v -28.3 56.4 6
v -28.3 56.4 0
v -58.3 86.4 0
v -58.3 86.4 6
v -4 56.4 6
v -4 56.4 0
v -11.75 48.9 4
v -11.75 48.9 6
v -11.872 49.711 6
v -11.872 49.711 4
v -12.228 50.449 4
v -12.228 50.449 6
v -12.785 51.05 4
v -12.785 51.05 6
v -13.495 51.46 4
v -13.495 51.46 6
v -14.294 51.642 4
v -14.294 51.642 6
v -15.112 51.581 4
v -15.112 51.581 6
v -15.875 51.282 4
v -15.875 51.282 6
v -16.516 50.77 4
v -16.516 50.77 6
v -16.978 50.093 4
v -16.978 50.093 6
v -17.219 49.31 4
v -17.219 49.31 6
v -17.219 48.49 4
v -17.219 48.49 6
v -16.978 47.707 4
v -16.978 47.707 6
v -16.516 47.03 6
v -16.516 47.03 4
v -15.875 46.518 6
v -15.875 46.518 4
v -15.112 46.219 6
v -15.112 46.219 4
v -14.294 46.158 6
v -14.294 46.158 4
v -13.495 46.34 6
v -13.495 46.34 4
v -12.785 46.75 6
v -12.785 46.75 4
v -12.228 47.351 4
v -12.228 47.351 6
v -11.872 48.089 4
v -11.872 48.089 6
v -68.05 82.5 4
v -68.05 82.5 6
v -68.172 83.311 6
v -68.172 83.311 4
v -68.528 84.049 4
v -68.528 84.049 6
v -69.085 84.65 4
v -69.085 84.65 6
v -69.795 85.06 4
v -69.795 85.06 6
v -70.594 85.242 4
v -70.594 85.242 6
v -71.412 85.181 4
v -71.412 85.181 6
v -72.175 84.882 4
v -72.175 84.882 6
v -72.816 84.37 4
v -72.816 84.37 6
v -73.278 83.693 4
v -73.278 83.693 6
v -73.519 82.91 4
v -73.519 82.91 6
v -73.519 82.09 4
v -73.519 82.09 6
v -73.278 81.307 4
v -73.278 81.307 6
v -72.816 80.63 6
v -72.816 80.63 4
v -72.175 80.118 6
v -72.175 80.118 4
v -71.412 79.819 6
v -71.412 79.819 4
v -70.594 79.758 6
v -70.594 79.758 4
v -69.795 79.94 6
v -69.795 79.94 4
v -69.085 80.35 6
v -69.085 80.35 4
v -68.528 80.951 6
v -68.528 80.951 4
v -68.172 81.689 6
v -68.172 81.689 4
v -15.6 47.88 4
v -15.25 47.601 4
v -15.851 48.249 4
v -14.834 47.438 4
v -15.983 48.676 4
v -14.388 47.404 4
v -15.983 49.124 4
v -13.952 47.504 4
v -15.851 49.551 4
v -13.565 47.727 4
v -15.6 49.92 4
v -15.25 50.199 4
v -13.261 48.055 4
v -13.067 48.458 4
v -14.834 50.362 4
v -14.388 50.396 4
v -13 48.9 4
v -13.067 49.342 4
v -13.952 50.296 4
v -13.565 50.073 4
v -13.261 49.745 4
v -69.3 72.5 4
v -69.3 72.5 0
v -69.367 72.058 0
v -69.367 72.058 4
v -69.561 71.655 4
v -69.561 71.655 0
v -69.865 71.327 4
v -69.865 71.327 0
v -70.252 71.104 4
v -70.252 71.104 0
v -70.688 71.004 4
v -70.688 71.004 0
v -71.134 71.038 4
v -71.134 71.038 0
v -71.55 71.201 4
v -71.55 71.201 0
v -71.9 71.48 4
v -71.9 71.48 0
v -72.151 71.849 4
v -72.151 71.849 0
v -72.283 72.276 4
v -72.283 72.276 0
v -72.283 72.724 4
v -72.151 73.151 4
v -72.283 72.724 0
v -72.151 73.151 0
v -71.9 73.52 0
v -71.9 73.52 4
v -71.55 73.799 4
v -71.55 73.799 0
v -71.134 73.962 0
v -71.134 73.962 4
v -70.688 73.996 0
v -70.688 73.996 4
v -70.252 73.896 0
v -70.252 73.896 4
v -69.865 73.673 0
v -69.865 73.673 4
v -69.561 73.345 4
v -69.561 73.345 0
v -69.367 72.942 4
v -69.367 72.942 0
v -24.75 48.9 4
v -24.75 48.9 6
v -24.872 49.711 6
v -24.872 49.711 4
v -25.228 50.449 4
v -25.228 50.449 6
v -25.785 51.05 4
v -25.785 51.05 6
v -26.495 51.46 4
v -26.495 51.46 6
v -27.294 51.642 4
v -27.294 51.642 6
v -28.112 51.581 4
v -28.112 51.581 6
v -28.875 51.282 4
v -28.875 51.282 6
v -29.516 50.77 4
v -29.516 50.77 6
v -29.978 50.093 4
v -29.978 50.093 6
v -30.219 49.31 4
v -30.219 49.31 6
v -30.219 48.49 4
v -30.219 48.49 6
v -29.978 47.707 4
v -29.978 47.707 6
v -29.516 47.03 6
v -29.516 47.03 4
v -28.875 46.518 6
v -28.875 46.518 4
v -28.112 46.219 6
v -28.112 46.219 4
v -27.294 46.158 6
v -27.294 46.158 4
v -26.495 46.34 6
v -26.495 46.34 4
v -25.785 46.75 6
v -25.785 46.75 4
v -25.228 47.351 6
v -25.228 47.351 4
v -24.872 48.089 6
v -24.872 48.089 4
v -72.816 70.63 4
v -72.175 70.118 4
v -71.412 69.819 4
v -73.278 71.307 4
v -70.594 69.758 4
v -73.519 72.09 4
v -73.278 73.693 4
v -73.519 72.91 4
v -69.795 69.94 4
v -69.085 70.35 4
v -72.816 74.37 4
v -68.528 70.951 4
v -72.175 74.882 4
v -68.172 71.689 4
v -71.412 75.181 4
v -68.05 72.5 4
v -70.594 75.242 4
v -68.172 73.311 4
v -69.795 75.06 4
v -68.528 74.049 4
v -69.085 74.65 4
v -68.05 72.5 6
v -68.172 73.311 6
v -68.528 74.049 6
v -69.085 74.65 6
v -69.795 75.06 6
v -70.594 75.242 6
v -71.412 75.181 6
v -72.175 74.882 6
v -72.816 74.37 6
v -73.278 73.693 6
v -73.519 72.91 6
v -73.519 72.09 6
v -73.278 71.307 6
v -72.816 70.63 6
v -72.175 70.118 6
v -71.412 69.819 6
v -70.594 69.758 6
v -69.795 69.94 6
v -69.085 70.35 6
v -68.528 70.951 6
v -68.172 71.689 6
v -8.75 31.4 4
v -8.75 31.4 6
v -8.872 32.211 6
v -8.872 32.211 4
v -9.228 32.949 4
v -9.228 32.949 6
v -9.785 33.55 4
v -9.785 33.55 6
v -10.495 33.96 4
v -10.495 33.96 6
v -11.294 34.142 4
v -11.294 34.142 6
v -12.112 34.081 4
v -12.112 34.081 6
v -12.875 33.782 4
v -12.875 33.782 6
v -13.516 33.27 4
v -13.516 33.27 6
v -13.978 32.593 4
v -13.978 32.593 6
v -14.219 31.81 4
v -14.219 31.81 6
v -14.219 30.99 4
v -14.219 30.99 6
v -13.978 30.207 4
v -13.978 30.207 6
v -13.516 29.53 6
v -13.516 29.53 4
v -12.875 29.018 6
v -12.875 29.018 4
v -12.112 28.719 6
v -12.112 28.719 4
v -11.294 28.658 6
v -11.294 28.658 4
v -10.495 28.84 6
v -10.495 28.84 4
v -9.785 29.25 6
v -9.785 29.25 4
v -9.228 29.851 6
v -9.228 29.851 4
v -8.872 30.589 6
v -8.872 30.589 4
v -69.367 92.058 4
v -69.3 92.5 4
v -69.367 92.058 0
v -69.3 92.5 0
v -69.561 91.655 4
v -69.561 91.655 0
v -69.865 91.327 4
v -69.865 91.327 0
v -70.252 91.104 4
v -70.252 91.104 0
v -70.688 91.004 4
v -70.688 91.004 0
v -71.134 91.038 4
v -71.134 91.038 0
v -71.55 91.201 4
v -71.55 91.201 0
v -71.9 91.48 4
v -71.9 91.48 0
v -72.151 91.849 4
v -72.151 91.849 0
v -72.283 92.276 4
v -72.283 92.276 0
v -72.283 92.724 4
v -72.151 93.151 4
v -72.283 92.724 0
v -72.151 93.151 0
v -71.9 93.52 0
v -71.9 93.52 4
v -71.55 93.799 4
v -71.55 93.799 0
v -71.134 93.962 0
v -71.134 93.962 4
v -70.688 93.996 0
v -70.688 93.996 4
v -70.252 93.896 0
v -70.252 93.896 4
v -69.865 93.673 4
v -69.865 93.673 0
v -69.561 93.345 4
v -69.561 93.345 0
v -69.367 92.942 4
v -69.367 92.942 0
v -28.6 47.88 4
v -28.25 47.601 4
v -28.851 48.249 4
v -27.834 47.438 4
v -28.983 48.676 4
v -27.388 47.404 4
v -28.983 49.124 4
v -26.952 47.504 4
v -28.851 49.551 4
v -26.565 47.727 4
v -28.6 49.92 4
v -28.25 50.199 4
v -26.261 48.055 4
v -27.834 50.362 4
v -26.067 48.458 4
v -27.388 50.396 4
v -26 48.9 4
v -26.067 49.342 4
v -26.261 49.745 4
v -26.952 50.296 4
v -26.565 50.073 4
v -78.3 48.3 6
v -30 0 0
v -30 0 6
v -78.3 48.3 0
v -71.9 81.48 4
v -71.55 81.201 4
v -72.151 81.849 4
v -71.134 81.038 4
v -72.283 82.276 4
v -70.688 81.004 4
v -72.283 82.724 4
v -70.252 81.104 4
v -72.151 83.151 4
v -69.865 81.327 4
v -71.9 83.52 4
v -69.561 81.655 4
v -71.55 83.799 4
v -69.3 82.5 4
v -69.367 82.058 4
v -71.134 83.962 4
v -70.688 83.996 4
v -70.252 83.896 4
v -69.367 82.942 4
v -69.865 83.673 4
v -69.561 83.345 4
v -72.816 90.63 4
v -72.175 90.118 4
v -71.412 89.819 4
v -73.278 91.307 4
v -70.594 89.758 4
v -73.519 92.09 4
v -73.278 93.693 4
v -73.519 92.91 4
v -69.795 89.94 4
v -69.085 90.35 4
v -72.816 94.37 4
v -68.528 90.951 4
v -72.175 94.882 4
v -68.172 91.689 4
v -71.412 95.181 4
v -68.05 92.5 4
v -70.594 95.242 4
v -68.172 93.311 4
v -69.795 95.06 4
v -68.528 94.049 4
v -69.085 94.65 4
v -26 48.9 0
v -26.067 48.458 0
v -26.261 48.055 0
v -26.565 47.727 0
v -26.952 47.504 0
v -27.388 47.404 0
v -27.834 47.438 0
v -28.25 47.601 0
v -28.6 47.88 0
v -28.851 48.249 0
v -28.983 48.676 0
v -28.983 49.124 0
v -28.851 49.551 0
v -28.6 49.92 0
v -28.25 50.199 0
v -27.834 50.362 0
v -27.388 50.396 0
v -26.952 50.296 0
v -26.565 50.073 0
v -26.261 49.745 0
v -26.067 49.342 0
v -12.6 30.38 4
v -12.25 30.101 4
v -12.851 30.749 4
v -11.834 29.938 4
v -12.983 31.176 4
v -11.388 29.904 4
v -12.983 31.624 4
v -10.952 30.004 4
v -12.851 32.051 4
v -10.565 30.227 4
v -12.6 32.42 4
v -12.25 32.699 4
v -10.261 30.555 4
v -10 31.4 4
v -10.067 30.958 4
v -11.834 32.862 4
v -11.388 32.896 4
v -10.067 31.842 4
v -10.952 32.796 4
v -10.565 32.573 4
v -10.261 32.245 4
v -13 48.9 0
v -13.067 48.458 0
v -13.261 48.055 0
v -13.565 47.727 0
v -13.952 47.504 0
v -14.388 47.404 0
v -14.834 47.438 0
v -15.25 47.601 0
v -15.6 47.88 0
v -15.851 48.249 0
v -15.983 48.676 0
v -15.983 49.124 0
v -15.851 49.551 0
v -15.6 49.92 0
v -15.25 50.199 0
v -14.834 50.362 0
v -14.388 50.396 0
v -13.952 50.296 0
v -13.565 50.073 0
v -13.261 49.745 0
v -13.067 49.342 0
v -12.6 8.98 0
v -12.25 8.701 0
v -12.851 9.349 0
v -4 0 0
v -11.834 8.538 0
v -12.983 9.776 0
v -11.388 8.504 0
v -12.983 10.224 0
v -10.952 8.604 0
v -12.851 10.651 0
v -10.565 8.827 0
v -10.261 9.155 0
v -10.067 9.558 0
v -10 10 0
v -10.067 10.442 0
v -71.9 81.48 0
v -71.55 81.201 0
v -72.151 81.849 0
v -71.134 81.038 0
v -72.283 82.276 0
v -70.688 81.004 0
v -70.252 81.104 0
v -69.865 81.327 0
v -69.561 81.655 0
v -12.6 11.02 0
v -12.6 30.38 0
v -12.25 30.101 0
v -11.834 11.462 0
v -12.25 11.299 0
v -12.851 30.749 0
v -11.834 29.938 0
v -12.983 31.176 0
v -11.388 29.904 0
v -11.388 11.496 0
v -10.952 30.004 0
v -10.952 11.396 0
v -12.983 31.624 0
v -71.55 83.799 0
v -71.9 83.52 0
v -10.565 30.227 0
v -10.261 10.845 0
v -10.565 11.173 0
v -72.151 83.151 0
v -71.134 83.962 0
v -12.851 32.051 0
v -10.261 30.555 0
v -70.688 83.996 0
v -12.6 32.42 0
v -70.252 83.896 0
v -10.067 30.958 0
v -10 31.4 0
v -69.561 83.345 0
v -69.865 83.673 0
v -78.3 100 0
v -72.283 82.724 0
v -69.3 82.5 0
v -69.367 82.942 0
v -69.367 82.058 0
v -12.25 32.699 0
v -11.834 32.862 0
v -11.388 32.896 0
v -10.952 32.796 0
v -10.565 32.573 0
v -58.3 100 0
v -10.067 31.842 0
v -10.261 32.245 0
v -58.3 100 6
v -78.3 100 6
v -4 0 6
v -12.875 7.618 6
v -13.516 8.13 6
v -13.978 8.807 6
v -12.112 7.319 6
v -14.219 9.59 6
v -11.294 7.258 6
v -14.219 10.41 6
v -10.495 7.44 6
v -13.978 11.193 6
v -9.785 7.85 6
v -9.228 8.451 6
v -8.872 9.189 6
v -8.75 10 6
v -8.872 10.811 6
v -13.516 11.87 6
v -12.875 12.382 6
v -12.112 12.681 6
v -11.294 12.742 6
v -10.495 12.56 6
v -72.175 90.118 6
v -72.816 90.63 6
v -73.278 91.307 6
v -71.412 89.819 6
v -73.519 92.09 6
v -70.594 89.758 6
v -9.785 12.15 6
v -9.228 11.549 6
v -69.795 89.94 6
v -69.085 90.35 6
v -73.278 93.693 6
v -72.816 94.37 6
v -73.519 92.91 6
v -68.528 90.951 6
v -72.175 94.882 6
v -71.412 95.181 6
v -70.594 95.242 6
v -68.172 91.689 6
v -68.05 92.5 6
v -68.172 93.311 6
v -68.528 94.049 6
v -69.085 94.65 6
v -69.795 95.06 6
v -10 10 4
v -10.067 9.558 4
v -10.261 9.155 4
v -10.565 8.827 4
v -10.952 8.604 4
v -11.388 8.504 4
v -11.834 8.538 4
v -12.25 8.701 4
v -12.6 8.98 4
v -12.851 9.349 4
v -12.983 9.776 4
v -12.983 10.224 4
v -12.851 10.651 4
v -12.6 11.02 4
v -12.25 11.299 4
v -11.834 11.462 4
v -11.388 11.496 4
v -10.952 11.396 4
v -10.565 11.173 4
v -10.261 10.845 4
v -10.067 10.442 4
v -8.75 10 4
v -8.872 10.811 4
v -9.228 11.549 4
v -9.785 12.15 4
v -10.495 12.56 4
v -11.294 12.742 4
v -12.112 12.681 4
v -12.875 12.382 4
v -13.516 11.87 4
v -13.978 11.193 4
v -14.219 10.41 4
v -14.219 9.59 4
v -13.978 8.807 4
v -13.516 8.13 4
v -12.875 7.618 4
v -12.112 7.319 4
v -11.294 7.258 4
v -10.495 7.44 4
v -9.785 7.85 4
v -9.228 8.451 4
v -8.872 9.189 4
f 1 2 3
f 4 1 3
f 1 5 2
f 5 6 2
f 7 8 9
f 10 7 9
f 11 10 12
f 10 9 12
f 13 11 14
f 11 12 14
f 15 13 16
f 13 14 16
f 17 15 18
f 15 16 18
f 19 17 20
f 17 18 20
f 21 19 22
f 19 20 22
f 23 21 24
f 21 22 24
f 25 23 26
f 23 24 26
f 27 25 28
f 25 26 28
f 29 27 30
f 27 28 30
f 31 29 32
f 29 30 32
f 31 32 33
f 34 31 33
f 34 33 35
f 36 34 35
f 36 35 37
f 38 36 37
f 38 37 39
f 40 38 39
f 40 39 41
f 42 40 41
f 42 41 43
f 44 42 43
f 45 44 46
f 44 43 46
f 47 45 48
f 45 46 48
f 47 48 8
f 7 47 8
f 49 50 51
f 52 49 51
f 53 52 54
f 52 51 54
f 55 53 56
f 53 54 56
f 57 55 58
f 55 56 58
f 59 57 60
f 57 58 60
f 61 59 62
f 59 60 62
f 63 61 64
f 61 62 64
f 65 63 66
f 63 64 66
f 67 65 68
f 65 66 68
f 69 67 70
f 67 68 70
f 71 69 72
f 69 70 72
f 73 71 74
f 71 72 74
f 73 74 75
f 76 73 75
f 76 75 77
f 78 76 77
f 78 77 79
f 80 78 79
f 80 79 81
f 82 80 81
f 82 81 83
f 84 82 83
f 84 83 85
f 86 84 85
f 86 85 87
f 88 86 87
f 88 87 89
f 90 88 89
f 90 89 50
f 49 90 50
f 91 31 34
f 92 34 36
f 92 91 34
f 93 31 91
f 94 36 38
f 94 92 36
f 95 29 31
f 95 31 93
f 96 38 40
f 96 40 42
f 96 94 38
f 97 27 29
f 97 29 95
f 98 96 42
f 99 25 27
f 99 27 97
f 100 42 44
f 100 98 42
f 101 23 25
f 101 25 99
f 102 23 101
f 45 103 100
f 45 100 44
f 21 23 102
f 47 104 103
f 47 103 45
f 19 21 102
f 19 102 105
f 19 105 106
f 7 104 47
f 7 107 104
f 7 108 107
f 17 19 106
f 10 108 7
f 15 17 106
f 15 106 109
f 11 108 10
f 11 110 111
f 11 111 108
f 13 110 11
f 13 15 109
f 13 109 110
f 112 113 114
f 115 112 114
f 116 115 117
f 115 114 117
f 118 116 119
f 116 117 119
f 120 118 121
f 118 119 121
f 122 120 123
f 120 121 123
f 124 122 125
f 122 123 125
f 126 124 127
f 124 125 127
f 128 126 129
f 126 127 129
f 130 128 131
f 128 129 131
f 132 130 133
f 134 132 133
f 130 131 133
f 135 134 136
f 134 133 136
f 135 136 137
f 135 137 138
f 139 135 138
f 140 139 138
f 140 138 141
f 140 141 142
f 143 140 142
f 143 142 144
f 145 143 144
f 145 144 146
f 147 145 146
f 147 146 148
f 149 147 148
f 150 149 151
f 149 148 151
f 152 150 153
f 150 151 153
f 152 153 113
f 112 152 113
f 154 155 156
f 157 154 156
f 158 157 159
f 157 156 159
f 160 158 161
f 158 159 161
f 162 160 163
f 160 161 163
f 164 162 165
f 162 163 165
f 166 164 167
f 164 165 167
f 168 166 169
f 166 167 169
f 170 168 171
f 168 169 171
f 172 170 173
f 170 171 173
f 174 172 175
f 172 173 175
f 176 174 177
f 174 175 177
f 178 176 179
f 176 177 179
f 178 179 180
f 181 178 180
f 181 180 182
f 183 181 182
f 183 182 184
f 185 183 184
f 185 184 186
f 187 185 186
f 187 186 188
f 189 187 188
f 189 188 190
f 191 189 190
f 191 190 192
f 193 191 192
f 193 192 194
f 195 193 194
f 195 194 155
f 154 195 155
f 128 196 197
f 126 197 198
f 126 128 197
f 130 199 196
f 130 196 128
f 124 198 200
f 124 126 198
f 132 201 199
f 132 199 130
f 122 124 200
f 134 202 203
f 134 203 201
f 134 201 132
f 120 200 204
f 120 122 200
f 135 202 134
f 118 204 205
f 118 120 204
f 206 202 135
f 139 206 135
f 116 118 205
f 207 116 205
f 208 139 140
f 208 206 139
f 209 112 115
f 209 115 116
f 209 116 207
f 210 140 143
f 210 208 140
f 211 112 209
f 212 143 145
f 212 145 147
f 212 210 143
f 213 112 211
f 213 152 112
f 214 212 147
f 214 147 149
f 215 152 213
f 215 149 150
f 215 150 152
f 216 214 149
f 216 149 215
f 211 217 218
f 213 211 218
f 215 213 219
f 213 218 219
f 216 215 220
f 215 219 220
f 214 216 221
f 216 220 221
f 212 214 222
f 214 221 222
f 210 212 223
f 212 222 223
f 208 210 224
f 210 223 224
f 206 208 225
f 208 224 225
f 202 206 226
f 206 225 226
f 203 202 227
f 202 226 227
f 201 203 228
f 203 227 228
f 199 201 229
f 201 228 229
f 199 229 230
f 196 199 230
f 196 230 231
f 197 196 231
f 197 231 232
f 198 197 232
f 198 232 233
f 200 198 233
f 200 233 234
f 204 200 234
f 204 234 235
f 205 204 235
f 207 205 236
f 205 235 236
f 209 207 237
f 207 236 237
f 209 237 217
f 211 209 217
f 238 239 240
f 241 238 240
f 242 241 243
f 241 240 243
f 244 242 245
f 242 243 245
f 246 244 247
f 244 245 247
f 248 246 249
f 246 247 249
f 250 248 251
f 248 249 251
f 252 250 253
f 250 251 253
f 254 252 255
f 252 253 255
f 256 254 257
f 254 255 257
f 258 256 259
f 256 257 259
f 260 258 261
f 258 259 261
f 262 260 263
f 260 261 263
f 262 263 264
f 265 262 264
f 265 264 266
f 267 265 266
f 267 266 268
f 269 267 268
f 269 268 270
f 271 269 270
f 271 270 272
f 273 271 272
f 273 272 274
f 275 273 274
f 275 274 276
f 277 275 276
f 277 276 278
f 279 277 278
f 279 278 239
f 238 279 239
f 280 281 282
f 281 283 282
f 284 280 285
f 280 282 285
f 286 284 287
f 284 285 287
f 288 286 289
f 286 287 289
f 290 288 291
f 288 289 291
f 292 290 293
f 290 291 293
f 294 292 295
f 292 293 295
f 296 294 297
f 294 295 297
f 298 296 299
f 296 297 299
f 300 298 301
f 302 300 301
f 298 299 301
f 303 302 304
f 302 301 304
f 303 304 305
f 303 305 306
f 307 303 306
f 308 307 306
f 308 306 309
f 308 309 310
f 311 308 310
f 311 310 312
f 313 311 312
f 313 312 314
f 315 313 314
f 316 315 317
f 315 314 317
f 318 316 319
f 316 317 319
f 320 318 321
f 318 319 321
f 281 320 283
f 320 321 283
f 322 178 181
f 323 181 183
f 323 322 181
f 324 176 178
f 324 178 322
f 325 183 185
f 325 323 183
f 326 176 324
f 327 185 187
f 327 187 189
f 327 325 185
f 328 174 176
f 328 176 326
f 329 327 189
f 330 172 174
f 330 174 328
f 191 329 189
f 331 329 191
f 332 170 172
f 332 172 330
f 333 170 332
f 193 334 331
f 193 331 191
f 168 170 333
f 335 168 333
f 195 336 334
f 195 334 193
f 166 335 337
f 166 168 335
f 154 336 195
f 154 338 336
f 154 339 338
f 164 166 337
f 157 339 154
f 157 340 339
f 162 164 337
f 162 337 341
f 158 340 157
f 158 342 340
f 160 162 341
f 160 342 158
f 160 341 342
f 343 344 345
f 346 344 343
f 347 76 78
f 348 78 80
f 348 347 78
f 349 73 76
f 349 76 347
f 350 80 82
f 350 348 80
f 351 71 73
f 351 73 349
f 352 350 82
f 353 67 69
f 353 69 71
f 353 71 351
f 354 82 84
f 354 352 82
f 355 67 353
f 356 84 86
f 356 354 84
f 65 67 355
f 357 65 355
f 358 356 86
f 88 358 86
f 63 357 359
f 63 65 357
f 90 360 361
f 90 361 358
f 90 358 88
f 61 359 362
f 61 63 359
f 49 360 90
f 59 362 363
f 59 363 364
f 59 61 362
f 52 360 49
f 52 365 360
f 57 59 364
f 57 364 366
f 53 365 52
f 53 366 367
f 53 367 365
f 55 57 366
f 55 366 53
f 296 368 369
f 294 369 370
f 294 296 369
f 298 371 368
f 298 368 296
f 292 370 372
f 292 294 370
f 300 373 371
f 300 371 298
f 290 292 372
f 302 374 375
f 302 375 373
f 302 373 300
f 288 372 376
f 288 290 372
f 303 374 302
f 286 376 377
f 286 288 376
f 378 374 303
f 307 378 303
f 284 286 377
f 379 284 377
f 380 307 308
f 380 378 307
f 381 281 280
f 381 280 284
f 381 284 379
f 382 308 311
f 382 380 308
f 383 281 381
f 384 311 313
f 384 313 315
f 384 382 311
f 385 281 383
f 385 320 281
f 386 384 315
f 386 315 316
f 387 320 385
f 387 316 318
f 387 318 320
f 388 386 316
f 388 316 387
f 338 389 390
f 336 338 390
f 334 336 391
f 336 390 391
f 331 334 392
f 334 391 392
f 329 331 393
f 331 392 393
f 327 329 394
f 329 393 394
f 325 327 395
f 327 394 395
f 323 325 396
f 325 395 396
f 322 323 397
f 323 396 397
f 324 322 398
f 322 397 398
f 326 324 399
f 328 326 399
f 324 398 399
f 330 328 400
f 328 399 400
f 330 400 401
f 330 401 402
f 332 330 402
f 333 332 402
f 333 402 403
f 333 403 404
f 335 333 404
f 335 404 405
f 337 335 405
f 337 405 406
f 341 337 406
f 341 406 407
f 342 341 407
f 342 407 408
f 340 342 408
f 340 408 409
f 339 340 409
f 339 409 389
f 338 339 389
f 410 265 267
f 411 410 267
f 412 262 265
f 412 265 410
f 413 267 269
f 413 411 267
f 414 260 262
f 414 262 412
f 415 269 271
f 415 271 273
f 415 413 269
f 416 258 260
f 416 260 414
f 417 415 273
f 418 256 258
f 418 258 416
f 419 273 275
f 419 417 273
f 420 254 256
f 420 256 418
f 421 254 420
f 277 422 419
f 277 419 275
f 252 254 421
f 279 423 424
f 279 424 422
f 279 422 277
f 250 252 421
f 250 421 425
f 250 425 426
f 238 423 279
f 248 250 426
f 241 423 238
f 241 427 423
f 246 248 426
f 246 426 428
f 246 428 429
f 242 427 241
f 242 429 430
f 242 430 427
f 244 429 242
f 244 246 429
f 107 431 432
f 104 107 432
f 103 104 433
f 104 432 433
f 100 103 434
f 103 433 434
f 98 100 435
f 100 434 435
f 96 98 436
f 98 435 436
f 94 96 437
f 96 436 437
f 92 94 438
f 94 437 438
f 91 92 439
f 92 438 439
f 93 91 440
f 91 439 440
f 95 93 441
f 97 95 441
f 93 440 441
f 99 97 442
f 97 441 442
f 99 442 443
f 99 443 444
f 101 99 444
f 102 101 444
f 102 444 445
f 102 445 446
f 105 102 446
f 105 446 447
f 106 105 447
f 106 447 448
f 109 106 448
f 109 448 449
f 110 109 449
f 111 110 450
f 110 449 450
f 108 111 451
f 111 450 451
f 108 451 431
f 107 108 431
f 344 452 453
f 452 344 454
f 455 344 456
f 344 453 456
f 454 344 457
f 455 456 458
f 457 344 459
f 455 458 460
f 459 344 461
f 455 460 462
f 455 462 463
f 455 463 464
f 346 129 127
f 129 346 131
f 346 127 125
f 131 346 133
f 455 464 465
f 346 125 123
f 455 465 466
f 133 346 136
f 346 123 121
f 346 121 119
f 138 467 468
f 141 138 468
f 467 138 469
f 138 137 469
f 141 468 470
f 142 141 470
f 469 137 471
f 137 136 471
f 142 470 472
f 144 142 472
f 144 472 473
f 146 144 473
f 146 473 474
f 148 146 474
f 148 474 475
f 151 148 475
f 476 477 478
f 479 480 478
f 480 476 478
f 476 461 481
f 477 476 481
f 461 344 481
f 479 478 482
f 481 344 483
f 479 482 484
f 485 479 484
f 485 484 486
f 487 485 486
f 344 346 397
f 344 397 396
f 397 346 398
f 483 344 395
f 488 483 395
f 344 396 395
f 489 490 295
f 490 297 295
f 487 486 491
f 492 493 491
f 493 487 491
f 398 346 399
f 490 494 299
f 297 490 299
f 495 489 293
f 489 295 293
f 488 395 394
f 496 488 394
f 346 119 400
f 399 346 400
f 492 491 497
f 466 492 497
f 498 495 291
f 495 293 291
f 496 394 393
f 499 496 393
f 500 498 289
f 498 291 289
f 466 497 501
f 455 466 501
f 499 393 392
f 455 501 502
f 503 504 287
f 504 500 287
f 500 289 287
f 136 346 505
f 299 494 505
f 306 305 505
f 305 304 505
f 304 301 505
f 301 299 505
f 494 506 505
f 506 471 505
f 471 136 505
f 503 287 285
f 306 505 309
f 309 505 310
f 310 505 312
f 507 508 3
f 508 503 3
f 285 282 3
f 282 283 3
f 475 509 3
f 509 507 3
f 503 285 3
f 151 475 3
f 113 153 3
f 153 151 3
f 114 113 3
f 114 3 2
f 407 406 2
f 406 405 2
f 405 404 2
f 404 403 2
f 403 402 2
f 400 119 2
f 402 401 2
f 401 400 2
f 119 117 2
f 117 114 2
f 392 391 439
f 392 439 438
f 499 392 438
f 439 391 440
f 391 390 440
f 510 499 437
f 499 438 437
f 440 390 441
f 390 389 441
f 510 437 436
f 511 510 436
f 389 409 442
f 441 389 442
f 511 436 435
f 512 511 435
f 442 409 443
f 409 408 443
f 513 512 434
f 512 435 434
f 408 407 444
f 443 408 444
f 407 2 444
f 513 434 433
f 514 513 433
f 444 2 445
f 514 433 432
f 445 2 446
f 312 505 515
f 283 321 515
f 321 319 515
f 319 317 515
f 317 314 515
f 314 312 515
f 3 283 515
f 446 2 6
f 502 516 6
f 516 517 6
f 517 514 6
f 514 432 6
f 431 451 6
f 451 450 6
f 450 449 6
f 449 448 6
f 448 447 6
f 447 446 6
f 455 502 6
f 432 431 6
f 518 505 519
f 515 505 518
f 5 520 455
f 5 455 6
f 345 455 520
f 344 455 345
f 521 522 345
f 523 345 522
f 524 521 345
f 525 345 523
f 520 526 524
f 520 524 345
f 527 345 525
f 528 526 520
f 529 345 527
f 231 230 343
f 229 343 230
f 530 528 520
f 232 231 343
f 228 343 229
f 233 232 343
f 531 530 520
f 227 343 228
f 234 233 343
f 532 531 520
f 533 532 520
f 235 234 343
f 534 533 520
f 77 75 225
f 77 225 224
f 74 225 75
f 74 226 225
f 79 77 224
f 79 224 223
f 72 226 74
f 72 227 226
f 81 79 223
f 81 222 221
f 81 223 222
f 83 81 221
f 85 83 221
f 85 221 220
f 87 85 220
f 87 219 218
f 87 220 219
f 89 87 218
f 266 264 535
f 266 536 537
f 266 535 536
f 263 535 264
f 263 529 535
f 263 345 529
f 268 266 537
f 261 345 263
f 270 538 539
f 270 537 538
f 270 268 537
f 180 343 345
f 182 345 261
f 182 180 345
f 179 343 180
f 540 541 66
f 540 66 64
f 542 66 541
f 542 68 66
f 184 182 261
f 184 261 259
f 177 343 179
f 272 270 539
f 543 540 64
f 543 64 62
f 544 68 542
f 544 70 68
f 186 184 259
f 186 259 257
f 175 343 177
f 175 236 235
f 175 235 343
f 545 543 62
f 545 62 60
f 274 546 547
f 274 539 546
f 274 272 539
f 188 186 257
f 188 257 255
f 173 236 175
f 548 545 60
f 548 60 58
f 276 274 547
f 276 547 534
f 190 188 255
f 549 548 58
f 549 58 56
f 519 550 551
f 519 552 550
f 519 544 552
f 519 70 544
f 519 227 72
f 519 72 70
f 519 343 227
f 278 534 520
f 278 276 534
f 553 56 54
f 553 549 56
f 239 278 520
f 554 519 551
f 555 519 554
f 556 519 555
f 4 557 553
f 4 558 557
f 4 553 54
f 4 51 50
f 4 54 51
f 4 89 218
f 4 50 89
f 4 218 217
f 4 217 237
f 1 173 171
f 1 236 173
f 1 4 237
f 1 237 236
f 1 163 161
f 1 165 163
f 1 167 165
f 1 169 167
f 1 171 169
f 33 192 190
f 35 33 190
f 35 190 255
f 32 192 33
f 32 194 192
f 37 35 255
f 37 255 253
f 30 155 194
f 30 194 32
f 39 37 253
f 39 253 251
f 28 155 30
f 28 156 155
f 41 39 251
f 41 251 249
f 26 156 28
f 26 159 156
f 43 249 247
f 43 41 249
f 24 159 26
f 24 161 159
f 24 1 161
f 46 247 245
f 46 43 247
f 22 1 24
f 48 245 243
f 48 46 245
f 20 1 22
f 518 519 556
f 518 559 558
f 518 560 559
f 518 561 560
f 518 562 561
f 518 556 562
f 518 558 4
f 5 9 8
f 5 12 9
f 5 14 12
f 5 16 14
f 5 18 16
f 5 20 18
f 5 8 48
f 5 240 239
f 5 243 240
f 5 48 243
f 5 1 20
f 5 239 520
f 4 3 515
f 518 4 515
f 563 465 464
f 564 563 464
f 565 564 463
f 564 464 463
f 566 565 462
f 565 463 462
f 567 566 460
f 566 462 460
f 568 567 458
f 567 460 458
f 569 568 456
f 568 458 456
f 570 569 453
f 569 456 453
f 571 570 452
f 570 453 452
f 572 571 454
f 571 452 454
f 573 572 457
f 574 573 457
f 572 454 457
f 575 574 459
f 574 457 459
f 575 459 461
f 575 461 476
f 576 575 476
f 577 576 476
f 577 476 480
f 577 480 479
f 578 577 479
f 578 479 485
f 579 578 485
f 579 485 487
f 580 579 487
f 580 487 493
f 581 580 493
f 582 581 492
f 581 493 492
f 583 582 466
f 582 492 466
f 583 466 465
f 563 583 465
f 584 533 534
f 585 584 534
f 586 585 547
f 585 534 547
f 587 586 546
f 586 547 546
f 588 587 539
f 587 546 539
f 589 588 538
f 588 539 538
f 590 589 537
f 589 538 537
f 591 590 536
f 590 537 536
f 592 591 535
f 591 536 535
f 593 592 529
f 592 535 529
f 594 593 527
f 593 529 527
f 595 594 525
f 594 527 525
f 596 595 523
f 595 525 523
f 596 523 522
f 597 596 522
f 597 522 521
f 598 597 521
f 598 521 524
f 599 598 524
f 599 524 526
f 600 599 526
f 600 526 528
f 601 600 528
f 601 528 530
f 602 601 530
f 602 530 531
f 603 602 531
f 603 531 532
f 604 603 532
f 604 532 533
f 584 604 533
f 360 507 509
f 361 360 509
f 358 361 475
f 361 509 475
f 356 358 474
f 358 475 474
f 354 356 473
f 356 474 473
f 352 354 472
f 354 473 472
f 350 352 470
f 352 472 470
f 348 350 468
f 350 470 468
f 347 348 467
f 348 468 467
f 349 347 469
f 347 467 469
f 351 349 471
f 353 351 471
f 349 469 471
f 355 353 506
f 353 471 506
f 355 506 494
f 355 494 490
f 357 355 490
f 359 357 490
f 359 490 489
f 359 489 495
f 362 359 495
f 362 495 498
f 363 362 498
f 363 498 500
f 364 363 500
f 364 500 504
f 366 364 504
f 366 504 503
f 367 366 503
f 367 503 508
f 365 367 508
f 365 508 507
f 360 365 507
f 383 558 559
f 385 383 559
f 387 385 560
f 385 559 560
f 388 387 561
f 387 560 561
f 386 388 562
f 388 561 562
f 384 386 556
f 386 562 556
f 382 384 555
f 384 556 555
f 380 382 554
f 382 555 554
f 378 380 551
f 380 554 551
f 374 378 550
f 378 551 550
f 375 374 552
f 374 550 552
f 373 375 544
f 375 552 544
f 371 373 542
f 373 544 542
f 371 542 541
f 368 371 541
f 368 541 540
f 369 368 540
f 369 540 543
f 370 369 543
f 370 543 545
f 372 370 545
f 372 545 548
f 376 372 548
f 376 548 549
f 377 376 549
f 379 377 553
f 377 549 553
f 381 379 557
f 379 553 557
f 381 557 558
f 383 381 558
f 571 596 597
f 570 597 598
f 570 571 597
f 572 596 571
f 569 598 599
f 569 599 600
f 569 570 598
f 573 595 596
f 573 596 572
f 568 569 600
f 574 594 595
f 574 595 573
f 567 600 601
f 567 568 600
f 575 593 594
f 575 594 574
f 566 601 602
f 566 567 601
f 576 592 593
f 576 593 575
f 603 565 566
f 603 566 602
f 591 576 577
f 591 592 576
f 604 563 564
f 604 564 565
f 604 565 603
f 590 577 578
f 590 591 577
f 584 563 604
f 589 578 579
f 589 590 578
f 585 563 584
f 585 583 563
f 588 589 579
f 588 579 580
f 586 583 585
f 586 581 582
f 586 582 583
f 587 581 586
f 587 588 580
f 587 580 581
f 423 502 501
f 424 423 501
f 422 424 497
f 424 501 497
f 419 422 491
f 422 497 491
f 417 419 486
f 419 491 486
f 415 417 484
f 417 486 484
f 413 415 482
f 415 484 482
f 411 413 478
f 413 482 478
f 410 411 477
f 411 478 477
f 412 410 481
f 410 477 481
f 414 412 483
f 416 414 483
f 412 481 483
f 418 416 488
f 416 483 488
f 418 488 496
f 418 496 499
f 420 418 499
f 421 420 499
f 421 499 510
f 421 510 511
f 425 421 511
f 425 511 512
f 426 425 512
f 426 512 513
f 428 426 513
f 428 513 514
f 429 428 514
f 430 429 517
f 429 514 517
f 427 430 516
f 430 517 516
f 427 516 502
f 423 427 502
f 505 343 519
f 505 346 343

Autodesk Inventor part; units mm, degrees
ref_plane "YZ Plane" through (0, 0, 0) normal (1, 0, 0) x (0, 1, 0)
ref_plane "XZ Plane" through (0, 0, 0) normal (0, 1, 0) x (-1, 0, 0)
ref_plane "XY Plane" through (0, 0, 0) normal (0, 0, 1) x (1, 0, 0)
sketch "Sketch1" plane through (0, 0, 0) normal (0, 0, 1) x (1, 0, 0)
  line L0 (0, 0) -> (-78.3, 0)
  line L1 (-78.3, 0) -> (-78.3, 100)
  line L2 (-78.3, 100) -> (0, 100)
  line L3 (0, 100) -> (0, 0)
  circle A0 centre (-11.5, 10) radius 1.5
  circle A1 centre (-11.5, 31.4) radius 1.5
  circle A2 centre (-14.5, 48.9) radius 1.5
  circle A3 centre (-27.5, 48.9) radius 1.5
  circle A4 centre (-70.8, 92.5) radius 1.5
  circle A5 centre (-70.8, 82.5) radius 1.5
  circle A6 centre (-70.8, 72.5) radius 1.5
  line L4 (0, 56.4) -> (-28.3, 56.4)
  line L5 (-28.3, 56.4) -> (-58.3, 86.4)
  line L6 (-58.3, 86.4) -> (-58.3, 100)
  line L7 (-30, 0) -> (-78.3, 48.3)
  dimension "d0" = 100
  dimension "d1" = 78.3
  dimension "d2" = 3
  dimension "d3" = 3
  dimension "d4" = 3
  dimension "d5" = 3
  dimension "d6" = 3
  dimension "d7" = 3
  dimension "d8" = 3
  dimension "d9" = 7.5
  dimension "d10" = 7.5
  dimension "d11" = 7.5
  dimension "d12" = 7.5
  dimension "d13" = 10
  dimension "d14" = 10
  dimension "d15" = 11.5
  dimension "d16" = 10
  dimension "d17" = 11.5
  dimension "d18" = 14.5
  dimension "d19" = 21.4
  dimension "d23" = 28.3
  dimension "d24" = 135
  dimension "d25" = 135
  dimension "d26" = 48.3
  dimension "d27" = 56.4
  dimension "d28" = 20
  dimension "d31" = 13
  dimension "d32" = 17.5
  dimension "d45" = 17.5
extrude "Extrusion1" add sketch "Sketch1" along normal blind 6 contours L0 L7 L1 L2 L6 L5 L4 L3
sketch "Sketch2" plane through (0, 0, 6) normal (0, 0, 1) x (1, 0, 0)
  line L0 (-30, 0) -> (0, 0) projected
  line L1 (0, 56.4) -> (-28.3, 56.4) projected
  line L2 (0, 0) -> (-4, 0)
  line L3 (-4, 0) -> (-4, 56.4)
  line L4 (-4, 56.4) -> (0, 56.4)
  line L5 (0, 56.4) -> (0, 0)
  dimension "d33" = 4
extrude "Extrusion2" cut sketch "Sketch2" against normal blind 6
sketch "Sketch3" plane through (0, 0, 6) normal (0, 0, 1) x (1, 0, 0)
  circle A0 centre (-11.5, 10) radius 1.5 projected
  circle A1 centre (-11.5, 31.4) radius 1.5 projected
  circle A2 centre (-11.5, 10) radius 2.75
  circle A3 centre (-11.5, 31.4) radius 1.5 projected
  circle A4 centre (-11.5, 31.4) radius 2.75
  circle A5 centre (-14.5, 48.9) radius 1.5 projected
  circle A6 centre (-27.5, 48.9) radius 1.5 projected
  circle A7 centre (-70.8, 72.5) radius 1.5 projected
  circle A8 centre (-70.8, 82.5) radius 1.5 projected
  circle A9 centre (-70.8, 92.5) radius 1.5 projected
  circle A10 centre (-14.5, 48.9) radius 1.5 projected
  circle A11 centre (-14.5, 48.9) radius 2.75
  circle A12 centre (-27.5, 48.9) radius 1.5 projected
  circle A13 centre (-27.5, 48.9) radius 2.75
  circle A14 centre (-70.8, 72.5) radius 1.5 projected
  circle A15 centre (-70.8, 72.5) radius 2.75
  circle A16 centre (-70.8, 82.5) radius 1.5 projected
  circle A17 centre (-70.8, 82.5) radius 2.75
  circle A18 centre (-70.8, 92.5) radius 1.5 projected
  circle A19 centre (-70.8, 92.5) radius 2.75
  point P0 (0, 0)
  dimension "d36" = 5.5
  dimension "d37" = 5.5
  dimension "d40" = 5.5
  dimension "d41" = 5.5
  dimension "d42" = 5.5
  dimension "d43" = 5.5
  dimension "d44" = 5.5
extrude "Extrusion3" cut sketch "Sketch3" against normal blind 2 contours A0 | A1 | A2 | A4 | A5 | A6 | A7 | A8 | A9 | A11 | A13 | A15 | A17 | A19
equation "\"d10\" = d9"
equation "\"d11\" = d9"
equation "\"d12\" = d11"
equation "\"d14\" = d13"
equation "\"d17\" = d15"
equation "\"d25\" = d24"
properties part number "Plate_standard_low_3D" material "Aluminum 6061, Welded"
